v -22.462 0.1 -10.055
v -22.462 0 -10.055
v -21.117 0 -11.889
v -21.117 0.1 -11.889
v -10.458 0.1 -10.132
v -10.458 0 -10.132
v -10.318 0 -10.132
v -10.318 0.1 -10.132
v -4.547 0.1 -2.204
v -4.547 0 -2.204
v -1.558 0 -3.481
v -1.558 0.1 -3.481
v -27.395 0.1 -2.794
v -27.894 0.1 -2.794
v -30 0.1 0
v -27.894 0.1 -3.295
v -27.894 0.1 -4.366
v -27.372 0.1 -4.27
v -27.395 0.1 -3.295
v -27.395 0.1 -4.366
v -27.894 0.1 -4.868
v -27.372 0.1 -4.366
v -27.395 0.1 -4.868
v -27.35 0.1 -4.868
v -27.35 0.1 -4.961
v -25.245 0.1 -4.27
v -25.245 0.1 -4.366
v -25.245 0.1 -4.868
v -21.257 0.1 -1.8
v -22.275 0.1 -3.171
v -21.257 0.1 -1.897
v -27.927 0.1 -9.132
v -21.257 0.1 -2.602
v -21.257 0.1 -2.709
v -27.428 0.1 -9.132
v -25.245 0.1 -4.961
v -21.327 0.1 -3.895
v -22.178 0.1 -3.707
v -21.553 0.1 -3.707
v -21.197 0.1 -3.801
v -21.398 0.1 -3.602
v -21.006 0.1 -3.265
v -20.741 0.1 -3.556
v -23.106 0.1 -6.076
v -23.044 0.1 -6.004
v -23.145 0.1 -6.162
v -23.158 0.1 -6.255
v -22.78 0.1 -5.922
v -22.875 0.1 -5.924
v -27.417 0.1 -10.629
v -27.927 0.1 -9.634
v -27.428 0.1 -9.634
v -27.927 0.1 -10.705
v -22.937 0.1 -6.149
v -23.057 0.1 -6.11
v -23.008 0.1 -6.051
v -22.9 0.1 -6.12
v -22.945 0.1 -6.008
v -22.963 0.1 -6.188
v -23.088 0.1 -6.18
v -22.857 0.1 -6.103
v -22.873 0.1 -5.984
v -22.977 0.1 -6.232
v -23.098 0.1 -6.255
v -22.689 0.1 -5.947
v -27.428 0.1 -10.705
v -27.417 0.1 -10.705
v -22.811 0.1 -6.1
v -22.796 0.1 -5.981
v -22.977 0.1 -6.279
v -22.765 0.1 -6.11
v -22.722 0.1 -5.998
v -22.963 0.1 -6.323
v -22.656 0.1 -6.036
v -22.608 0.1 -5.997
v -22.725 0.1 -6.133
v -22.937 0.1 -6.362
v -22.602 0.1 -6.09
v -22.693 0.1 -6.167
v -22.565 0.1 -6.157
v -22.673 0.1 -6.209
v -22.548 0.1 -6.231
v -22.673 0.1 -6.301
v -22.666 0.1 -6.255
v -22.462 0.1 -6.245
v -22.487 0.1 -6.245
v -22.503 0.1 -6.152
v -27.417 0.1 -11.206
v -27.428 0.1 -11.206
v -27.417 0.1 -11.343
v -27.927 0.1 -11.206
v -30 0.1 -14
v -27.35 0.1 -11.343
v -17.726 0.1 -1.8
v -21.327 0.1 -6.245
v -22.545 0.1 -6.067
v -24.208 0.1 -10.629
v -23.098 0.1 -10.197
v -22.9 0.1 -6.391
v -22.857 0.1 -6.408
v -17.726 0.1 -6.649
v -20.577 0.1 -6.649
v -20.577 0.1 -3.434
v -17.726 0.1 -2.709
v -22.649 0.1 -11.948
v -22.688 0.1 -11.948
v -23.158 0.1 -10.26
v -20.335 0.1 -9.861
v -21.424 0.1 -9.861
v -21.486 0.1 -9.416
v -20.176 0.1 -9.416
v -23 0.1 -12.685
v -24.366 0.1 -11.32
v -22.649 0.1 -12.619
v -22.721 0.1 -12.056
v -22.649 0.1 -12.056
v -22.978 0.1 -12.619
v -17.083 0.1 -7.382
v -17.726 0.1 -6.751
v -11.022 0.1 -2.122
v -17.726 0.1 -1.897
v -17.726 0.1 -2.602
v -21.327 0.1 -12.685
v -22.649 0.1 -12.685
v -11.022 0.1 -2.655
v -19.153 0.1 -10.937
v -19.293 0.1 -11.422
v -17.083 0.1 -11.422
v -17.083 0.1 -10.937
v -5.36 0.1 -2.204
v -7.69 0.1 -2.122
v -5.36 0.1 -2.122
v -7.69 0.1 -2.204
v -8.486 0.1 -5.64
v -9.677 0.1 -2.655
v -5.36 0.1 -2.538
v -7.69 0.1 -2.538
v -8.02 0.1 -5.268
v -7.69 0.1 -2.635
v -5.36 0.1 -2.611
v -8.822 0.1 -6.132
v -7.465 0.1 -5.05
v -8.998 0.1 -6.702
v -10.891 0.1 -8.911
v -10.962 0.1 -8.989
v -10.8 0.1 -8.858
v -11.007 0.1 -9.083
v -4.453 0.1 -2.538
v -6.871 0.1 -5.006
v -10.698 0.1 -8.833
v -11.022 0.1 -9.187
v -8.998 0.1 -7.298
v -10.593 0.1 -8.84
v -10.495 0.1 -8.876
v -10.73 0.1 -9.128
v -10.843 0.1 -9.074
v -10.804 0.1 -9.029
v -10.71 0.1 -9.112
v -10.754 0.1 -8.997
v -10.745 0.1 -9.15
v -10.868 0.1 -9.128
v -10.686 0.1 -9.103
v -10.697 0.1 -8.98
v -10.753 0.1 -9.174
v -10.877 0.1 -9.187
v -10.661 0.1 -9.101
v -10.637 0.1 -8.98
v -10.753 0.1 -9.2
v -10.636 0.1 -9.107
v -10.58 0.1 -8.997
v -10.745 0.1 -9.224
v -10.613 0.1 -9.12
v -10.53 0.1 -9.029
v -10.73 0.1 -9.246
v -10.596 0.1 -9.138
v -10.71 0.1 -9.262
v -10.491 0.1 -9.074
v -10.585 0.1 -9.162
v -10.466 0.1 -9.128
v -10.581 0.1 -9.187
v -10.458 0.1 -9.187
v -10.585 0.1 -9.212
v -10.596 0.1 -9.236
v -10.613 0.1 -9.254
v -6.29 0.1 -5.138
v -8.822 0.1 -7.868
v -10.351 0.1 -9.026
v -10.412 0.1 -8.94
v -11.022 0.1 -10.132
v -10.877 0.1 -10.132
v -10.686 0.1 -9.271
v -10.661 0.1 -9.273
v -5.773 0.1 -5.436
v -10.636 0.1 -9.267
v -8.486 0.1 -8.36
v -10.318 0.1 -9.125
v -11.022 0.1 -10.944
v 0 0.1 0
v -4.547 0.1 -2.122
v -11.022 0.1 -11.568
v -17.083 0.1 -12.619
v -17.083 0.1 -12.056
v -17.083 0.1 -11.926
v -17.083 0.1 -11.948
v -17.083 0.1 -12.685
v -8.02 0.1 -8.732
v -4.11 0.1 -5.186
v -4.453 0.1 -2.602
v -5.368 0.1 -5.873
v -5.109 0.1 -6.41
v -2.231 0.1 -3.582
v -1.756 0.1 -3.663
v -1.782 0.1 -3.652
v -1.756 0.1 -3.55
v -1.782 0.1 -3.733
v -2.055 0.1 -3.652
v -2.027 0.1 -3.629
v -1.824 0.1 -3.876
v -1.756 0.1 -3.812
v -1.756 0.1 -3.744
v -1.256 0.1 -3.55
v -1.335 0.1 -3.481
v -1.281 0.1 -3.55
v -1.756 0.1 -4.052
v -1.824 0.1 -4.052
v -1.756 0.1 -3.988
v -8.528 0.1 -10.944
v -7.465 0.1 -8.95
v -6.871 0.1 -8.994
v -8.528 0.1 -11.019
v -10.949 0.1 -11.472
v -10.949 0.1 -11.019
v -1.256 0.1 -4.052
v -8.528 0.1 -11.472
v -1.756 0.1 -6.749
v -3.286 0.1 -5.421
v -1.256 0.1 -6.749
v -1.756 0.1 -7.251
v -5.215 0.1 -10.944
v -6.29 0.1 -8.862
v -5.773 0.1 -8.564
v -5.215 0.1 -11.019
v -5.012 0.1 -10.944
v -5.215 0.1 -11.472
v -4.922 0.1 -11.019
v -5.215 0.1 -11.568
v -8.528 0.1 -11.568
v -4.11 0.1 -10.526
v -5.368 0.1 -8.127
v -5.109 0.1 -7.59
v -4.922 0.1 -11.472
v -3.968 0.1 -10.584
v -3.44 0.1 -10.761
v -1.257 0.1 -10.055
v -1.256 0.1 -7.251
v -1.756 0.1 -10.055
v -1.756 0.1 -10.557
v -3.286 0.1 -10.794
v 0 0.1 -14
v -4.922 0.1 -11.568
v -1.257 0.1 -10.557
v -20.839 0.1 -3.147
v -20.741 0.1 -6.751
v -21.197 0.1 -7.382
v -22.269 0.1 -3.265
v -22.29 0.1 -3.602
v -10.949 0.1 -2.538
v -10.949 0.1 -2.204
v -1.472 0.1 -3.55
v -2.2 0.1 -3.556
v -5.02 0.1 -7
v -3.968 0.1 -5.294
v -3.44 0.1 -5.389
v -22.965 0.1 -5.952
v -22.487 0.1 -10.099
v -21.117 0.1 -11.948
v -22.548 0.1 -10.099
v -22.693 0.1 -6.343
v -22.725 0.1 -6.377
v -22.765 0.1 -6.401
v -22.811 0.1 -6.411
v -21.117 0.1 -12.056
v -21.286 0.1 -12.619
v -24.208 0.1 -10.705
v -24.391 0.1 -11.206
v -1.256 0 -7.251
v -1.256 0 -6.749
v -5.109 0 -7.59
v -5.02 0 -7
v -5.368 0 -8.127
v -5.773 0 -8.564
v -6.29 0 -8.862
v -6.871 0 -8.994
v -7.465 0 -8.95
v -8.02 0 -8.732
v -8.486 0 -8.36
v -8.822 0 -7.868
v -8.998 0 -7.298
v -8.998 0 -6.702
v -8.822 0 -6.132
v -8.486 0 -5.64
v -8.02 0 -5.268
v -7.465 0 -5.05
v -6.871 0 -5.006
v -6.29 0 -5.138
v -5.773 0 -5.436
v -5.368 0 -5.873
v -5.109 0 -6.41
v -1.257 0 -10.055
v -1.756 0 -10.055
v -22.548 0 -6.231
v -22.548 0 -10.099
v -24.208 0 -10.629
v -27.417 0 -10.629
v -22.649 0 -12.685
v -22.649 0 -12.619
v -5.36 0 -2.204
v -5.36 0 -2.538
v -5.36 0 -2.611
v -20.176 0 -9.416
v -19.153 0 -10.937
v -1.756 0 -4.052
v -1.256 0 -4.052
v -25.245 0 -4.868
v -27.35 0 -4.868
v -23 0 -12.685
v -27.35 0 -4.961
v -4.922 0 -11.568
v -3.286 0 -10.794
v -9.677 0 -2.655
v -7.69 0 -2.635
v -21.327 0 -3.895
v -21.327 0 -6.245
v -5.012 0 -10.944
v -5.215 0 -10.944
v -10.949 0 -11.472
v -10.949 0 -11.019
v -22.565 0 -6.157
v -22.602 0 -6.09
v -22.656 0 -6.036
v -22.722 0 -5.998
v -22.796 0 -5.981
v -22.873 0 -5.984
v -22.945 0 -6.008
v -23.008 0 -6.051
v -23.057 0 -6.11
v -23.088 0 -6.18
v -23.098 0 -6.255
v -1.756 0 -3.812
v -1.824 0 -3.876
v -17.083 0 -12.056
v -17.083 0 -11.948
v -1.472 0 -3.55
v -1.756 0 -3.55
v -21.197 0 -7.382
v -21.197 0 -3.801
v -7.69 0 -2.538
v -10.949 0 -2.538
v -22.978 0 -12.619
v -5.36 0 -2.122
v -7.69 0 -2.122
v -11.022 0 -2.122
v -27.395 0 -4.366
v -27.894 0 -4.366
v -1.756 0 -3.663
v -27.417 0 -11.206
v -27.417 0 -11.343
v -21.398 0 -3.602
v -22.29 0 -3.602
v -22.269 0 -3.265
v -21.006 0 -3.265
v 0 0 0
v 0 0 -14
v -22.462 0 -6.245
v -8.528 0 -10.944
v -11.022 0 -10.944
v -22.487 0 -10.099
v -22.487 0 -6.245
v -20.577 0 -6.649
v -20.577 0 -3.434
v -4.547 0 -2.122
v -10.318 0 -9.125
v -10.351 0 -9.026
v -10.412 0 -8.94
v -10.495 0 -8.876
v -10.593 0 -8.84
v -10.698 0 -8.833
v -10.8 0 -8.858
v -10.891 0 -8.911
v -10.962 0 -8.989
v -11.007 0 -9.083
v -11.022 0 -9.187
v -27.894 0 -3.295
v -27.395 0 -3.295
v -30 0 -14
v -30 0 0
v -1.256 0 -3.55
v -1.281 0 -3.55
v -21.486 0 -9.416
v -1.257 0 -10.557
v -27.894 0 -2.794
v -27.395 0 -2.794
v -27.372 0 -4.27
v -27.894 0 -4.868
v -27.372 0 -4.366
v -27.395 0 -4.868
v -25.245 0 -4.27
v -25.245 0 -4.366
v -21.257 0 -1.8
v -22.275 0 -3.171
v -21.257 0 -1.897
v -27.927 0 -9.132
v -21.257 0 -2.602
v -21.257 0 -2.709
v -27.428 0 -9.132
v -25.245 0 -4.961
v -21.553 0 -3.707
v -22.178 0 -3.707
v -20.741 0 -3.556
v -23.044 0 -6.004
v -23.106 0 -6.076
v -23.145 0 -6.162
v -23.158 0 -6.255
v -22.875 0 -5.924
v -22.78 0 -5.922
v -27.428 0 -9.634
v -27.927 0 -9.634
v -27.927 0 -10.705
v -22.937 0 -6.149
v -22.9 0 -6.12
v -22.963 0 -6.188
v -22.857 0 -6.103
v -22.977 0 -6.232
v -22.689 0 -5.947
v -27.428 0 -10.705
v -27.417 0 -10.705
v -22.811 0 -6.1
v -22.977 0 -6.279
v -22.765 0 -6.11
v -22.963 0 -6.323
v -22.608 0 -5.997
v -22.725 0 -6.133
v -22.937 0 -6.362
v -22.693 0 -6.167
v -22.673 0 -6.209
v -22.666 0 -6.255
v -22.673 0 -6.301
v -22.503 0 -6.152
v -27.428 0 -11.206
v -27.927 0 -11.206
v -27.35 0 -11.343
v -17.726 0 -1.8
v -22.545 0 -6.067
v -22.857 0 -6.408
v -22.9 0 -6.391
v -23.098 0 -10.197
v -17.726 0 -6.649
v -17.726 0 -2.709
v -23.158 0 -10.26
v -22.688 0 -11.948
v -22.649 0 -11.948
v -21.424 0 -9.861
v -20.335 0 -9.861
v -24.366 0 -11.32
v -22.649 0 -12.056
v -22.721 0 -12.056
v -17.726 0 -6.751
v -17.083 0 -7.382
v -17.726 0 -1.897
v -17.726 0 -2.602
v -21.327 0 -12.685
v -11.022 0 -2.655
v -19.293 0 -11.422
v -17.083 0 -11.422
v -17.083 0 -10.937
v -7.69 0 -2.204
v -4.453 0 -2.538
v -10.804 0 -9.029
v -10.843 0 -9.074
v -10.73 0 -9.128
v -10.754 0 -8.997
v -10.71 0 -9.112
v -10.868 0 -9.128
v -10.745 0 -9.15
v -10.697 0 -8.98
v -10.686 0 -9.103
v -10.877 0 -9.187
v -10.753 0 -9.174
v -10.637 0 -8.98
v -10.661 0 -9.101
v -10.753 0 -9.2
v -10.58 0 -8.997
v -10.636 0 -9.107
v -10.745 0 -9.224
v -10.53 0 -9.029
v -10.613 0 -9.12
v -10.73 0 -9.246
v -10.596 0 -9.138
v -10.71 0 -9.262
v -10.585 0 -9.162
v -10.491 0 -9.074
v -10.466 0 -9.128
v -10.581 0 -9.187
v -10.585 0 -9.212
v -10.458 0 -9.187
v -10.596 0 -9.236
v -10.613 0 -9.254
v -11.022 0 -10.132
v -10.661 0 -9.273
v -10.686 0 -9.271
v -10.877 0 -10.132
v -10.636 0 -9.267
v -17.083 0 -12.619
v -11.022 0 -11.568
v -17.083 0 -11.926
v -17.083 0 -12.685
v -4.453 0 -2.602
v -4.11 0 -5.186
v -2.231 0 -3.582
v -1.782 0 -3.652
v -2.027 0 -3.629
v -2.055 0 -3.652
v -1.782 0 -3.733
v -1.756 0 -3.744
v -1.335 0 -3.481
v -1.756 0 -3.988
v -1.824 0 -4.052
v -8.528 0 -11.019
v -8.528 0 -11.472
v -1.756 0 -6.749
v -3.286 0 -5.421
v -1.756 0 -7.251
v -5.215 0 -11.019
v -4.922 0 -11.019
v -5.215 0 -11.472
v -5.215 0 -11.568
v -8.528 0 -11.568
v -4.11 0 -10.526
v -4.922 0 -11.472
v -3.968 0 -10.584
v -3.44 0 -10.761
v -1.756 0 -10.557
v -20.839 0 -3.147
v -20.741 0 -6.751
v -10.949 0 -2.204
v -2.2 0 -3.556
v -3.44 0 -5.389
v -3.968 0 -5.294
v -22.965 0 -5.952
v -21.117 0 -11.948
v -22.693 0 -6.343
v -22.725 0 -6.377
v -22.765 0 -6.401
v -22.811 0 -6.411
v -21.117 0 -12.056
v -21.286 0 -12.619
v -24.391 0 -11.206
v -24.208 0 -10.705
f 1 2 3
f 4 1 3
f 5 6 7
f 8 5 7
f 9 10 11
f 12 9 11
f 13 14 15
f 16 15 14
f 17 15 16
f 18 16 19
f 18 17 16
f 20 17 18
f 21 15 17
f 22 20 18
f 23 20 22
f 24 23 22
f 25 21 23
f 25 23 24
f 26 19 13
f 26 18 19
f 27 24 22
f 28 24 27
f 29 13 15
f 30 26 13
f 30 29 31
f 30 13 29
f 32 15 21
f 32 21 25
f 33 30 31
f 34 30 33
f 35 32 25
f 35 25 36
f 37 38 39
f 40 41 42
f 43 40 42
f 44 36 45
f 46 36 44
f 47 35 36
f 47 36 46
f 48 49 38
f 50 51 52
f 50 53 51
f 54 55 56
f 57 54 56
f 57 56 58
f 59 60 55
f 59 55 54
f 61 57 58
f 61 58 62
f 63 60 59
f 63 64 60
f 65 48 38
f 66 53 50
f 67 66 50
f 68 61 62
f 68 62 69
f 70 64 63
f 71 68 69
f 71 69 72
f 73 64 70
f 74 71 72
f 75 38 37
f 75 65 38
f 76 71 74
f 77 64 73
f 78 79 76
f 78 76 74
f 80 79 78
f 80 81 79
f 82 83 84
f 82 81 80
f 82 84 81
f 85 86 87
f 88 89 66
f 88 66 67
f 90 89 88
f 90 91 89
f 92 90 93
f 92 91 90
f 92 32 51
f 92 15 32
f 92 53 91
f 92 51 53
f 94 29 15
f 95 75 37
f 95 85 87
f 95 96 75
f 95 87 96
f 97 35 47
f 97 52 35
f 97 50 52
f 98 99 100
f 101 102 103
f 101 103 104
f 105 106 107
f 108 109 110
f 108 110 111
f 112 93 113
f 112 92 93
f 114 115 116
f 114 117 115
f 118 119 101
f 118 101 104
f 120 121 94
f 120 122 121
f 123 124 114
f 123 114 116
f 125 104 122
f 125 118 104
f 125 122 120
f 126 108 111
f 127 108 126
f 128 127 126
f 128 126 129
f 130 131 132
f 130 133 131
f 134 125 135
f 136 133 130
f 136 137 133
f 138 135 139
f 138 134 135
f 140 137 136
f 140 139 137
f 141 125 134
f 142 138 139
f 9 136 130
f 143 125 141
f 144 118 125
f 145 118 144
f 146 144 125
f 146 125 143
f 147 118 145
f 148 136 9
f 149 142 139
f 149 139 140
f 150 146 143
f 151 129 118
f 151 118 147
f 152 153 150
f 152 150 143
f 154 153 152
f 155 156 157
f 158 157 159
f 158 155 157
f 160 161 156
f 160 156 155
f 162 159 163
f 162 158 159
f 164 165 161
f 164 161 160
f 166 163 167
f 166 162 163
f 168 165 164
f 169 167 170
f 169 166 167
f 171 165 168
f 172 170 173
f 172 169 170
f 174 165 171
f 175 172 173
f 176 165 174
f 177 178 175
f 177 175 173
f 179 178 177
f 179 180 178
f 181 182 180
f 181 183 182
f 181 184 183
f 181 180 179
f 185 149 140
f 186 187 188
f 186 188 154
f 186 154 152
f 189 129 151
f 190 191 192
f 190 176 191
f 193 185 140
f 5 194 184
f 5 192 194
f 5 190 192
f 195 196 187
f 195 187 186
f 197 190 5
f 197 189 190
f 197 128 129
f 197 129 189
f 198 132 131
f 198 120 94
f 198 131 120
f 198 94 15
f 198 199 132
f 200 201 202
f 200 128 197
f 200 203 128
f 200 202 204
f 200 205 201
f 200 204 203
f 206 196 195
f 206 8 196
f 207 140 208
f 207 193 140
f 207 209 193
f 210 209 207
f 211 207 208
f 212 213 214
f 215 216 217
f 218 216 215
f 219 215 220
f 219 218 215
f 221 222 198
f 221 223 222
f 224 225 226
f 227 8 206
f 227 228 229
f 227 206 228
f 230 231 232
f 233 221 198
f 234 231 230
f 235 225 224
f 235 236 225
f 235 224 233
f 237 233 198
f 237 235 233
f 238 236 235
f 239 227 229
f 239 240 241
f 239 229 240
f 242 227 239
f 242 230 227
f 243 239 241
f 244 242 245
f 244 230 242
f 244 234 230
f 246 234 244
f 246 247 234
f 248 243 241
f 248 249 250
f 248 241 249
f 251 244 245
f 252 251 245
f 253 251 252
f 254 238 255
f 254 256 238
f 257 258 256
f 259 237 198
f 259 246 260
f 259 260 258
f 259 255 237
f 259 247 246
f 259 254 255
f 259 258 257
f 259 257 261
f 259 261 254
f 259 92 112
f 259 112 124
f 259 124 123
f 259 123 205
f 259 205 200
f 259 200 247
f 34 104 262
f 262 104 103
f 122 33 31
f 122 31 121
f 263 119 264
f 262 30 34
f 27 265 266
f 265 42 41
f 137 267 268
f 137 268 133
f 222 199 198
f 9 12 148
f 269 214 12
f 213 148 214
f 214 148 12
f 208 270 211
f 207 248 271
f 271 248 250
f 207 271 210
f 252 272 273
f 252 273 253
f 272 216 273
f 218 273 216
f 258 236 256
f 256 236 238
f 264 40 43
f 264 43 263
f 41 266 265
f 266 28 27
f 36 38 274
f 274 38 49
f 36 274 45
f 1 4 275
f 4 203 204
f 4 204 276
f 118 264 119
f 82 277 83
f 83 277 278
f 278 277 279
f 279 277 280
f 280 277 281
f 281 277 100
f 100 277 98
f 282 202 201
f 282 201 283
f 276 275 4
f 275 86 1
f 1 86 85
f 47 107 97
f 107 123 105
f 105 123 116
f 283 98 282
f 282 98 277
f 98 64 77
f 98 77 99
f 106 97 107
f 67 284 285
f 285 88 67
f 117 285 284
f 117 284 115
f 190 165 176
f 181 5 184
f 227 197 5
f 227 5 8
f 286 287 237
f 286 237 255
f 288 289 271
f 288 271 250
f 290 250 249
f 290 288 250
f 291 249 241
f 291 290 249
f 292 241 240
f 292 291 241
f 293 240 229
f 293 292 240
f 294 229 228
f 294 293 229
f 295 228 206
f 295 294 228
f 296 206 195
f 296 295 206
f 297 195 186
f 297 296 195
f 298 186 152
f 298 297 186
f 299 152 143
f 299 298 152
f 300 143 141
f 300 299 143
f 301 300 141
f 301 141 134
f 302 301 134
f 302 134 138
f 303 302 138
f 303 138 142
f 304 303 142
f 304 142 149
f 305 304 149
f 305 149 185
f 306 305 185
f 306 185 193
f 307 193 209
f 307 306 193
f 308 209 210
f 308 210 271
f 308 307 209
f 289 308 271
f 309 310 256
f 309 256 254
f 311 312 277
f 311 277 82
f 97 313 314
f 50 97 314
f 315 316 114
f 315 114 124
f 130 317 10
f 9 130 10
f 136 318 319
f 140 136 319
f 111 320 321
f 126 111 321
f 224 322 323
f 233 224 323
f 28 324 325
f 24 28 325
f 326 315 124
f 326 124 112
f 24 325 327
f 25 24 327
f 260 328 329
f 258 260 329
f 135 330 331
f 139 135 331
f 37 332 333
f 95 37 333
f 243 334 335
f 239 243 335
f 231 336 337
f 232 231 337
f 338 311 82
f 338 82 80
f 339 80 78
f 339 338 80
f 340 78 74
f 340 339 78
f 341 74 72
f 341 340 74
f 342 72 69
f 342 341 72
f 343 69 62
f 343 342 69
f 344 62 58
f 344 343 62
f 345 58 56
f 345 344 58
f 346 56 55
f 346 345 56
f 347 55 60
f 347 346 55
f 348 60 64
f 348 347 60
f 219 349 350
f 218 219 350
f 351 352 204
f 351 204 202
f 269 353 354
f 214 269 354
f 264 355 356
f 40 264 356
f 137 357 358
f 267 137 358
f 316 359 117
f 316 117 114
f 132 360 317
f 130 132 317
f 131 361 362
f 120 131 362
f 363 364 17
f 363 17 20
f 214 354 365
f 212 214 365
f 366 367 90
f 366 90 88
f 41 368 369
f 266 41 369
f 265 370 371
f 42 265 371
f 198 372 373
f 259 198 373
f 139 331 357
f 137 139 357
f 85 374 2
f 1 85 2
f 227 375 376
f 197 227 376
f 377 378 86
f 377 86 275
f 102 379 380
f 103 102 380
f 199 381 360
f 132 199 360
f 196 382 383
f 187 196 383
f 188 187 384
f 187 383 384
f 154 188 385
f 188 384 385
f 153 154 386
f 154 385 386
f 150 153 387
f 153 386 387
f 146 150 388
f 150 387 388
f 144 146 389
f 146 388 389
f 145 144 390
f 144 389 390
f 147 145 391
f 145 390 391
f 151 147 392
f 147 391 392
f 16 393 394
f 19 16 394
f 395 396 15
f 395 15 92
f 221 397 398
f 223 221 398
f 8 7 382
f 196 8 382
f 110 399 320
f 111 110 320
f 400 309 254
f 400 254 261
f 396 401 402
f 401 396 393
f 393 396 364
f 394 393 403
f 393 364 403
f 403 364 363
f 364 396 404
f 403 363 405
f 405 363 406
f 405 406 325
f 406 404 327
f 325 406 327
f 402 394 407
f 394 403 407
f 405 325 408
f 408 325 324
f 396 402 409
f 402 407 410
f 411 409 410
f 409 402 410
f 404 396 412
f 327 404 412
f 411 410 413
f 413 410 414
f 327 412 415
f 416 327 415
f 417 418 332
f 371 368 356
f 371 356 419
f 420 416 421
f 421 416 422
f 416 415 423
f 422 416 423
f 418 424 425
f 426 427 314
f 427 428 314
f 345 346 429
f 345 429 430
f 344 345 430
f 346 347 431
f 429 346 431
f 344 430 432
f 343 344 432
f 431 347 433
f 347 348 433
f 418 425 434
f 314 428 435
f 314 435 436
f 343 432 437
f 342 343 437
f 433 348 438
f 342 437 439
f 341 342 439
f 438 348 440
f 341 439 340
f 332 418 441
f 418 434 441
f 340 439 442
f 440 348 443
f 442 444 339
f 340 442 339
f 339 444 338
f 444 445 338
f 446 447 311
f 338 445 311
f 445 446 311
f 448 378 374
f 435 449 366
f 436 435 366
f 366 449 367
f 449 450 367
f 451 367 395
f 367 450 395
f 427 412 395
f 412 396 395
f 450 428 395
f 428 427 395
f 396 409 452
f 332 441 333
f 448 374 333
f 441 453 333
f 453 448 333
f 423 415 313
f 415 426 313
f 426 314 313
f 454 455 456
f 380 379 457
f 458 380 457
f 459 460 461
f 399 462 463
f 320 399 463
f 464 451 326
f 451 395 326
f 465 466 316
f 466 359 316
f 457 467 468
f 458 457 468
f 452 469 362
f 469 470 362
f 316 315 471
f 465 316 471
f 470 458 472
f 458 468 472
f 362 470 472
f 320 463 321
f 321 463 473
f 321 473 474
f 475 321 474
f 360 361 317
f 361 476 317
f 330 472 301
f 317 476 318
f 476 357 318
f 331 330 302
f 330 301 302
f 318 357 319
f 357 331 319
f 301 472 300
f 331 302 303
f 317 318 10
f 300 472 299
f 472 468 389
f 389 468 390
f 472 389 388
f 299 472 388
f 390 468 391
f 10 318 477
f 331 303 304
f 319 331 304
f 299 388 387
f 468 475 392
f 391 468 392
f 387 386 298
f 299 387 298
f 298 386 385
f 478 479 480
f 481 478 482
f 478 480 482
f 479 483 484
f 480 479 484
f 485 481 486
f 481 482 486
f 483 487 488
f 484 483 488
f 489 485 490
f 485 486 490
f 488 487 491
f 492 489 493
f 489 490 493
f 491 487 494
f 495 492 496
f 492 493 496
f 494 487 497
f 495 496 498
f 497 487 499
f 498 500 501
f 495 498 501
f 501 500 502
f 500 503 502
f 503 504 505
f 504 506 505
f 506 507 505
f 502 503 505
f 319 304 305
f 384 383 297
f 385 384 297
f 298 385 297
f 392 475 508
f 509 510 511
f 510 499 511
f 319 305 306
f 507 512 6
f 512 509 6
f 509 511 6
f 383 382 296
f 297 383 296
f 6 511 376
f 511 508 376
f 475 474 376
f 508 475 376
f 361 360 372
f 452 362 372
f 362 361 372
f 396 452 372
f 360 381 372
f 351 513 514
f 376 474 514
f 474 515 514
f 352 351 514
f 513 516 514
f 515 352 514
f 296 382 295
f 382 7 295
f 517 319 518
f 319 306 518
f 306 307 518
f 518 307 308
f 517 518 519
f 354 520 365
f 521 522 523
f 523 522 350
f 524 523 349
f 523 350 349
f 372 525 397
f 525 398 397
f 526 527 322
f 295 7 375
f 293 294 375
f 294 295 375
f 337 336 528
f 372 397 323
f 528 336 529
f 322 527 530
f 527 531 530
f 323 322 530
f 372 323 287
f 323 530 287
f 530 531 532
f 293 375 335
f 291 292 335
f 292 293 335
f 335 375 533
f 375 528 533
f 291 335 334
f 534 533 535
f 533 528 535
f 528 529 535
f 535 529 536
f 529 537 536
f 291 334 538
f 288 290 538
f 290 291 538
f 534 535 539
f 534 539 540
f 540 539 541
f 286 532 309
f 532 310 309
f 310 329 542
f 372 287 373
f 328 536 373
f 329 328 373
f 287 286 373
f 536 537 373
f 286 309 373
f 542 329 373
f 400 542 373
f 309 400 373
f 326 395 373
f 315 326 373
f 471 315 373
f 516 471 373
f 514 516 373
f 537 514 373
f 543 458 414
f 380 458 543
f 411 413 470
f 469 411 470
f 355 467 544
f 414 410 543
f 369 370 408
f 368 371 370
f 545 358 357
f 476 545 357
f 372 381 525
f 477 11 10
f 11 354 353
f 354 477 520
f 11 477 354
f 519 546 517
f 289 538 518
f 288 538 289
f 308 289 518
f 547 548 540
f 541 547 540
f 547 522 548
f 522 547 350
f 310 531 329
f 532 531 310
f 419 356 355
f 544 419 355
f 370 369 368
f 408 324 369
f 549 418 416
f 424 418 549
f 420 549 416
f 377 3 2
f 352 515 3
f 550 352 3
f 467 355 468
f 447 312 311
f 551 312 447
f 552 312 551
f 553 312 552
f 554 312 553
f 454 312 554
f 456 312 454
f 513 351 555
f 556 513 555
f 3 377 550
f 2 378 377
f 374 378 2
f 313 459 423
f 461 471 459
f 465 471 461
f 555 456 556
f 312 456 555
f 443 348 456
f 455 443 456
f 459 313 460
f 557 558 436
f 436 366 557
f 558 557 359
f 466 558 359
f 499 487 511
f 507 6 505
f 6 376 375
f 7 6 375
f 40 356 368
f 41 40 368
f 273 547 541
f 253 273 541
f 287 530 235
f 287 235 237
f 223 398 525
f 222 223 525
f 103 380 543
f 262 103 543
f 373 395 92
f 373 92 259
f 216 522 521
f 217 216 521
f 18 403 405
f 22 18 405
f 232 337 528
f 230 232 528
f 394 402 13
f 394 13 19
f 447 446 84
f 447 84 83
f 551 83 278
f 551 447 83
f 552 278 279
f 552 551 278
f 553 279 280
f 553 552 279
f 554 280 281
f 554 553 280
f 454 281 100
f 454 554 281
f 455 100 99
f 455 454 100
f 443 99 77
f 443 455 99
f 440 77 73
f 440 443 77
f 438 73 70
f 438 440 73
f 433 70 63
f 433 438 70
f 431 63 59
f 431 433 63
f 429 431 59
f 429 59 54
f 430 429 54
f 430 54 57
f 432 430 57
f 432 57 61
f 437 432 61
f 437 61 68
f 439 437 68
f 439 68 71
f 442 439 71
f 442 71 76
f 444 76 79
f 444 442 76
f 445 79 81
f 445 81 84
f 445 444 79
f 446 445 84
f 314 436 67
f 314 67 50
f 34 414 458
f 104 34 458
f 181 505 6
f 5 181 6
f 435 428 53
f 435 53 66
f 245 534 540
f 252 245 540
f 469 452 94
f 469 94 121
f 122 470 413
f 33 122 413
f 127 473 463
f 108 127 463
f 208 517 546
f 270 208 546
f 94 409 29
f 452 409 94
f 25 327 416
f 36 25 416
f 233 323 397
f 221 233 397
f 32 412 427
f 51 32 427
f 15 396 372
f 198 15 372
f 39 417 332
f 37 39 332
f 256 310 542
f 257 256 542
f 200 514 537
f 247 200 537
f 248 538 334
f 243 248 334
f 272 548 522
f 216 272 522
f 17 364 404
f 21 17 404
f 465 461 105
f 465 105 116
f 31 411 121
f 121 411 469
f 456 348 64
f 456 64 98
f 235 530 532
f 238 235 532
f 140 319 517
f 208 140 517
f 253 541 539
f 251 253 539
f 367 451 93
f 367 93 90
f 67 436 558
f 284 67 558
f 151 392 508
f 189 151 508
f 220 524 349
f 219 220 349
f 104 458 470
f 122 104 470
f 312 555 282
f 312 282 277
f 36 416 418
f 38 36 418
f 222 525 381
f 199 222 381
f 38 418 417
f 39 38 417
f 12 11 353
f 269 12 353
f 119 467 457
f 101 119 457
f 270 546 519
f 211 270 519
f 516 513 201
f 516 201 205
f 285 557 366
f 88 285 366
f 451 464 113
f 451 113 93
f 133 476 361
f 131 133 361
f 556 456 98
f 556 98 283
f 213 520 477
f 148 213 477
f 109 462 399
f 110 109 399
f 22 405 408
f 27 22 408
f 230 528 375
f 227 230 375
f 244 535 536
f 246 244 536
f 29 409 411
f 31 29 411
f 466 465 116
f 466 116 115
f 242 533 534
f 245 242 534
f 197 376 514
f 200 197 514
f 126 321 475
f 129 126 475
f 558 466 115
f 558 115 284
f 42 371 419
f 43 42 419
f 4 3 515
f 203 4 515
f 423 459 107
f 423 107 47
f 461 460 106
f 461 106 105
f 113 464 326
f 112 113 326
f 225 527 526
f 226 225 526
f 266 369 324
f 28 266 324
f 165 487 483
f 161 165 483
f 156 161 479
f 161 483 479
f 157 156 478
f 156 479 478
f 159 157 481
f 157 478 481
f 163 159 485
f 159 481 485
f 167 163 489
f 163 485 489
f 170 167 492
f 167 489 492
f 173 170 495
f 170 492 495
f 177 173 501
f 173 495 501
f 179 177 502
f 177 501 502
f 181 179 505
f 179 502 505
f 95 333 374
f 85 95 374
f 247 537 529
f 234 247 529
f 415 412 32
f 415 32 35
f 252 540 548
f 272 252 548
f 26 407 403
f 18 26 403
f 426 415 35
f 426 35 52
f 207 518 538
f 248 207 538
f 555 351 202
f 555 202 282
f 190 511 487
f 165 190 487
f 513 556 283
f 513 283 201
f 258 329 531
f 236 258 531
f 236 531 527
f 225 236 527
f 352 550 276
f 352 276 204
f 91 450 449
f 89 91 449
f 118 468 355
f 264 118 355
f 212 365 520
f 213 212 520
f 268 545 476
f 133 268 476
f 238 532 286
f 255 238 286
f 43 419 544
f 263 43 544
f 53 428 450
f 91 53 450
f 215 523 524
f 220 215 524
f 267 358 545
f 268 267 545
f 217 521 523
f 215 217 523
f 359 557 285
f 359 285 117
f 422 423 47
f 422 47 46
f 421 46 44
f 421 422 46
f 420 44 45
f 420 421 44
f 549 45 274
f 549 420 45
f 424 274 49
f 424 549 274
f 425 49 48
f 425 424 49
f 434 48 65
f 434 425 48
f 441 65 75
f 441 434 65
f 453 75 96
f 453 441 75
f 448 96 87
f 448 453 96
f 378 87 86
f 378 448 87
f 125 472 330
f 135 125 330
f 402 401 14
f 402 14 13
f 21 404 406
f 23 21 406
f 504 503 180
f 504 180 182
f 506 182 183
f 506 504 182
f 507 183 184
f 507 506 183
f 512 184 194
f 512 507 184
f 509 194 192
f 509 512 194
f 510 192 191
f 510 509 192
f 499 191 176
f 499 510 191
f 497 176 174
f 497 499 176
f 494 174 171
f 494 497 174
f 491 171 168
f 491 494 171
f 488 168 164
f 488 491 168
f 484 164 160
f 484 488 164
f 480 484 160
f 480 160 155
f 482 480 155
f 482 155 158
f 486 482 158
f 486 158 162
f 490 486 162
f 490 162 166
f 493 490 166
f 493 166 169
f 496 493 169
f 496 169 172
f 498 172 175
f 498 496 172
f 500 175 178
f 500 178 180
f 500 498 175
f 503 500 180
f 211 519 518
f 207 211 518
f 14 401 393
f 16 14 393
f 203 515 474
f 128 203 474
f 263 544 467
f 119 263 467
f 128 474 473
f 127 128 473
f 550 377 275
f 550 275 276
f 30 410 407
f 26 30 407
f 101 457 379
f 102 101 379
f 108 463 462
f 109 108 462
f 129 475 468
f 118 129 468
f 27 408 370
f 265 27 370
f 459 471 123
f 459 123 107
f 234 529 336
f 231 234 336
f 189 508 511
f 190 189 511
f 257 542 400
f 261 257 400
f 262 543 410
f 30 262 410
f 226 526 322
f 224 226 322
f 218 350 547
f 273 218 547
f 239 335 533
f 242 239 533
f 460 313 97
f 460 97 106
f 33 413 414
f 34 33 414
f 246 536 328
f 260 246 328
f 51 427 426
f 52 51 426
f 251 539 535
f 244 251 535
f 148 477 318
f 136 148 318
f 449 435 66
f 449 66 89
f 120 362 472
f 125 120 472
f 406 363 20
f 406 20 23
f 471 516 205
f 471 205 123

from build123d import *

# Parameters (mm, degrees)
SKETCH1_W           = 30
SKETCH1_H           = 14
SKETCH1_R           = 2
SKETCH1_R_2         = 0.156028334
SKETCH1_R_3         = 0.086225259
SKETCH1_W_2         = 0.499197809
SKETCH1_H_2         = 0.501456342
SKETCH1_H_3         = 0.501456343
SKETCH1_W_3         = 3.5304532
SKETCH1_H_4         = 0.096477131
BOSS_EXTRUDE2_DEPTH = 0.1


with BuildPart() as part:
    # Sketch1 → Boss-Extrude2 (new body)
    with BuildSketch(Plane(origin=(0, 0, 0), x_dir=(1, 0, 0), z_dir=(0, 1, 0))):
        with Locations((-15, 7)):
            Rectangle(SKETCH1_W, SKETCH1_H)
        with Locations((-7.020370045, 7)):
            Circle(SKETCH1_R, mode=Mode.SUBTRACT)
        with Locations((-22.822406344, 6.255391347)):
            Circle(SKETCH1_R_2, mode=Mode.SUBTRACT)
        with Locations((-10.66724947, 9.187062819)):
            Circle(SKETCH1_R_3, mode=Mode.SUBTRACT)
        with Locations((-1.506295526, 10.305773891)):
            Rectangle(SKETCH1_W_2, SKETCH1_H_2, mode=Mode.SUBTRACT)
        with Locations((-1.506058557, 7)):
            Rectangle(SKETCH1_W_2, SKETCH1_H_2, mode=Mode.SUBTRACT)
        Polygon((-1.256485692, 3.550454026), (-1.28140444, 3.550454026), (-1.335016171, 3.481213999), (-4.54690164, 2.121887432), (-5.360261371, 2.121887432), (-5.360261371, 2.203832458), (-4.54690164, 2.203832458), (-1.558352374, 3.481213999), (-1.472133003, 3.550454026), (-1.755683501, 3.550454026), (-1.755683501, 3.663429203), (-1.781688576, 3.652423397), (-4.453252976, 2.537894228), (-5.360261371, 2.537894228), (-5.360261371, 2.611390791), (-4.453252976, 2.602147786), (-2.199910697, 3.555801973), (-2.230986224, 3.58233105), (-4.109880419, 5.186336967), (-4.109880419, 10.52625285), (-5.01178132, 10.9436629), (-5.2151716, 10.9436629), (-5.2151716, 11.019115731), (-4.92219693, 11.019115731), (-3.967960979, 10.583630365), (-3.967960979, 5.294234739), (-2.054874003, 3.652423397), (-2.027101226, 3.628937988), (-1.781688576, 3.732800949), (-1.755683501, 3.743806755), (-1.755683501, 3.811781185), (-1.824138086, 3.875872934), (-3.440230513, 5.388966468), (-3.440230513, 10.76142511), (-4.92219693, 11.471832711), (-5.2151716, 11.471832711), (-5.2151716, 11.567863586), (-4.92219693, 11.567863586), (-3.286271687, 10.793793894), (-3.286271687, 5.420857378), (-1.824138086, 4.051910368), (-1.755683501, 3.987818619), (-1.755683501, 4.051910368), (-1.256485692, 4.051910368), align=None, mode=Mode.SUBTRACT)
        Polygon((-20.740691313, 3.555801973), (-20.740691313, 6.751171354), (-17.726140192, 6.751171354), (-17.726140192, 6.648804669), (-20.577135817, 6.648804669), (-20.577135817, 6.588691856), (-20.577135817, 3.434422851), (-20.839350262, 3.147232695), (-22.275377127, 3.170945708), (-25.245108692, 4.270018773), (-27.280489968, 4.270018773), (-27.371609442, 4.270018773), (-27.371609442, 4.36632395), (-27.280489968, 4.36632395), (-25.245108692, 4.36632395), (-22.268787234, 3.26481202), (-21.006375102, 3.26481202), align=None, mode=Mode.SUBTRACT)
        Polygon((-21.196743275, 7.250728171), (-21.196743275, 4.159991696), (-21.196743275, 3.801090583), (-21.398034662, 3.601705999), (-22.289698939, 3.601705999), (-25.245108692, 4.867780292), (-27.280489968, 4.867780292), (-27.350305288, 4.867780292), (-27.350305288, 4.960770533), (-27.280489968, 4.960770533), (-25.245108692, 4.960770533), (-22.177931991, 3.706985367), (-21.552803523, 3.706985367), (-21.32716444, 3.895195799), (-21.32716444, 6.24470924), (-22.461941115, 6.24470924), (-22.461941115, 10.05504572), (-21.11708673, 11.889354862), (-17.082611668, 11.926021935), (-17.082611668, 11.511053117), (-17.082611668, 11.422021861), (-17.122361985, 11.422021861), (-19.29309074, 11.422021861), (-20.335207519, 9.860770298), (-21.423827816, 9.860770298), (-21.486437697, 9.415587946), (-20.176259884, 9.415587946), (-19.152866511, 10.937472578), (-17.122361985, 10.937472578), (-17.082611668, 10.937472578), (-17.082611668, 10.879889975), (-17.082611668, 7.382432578), (-17.726140192, 7.382432578), (-20.577135817, 7.382432578), (-21.196743275, 7.382432578), align=None, mode=Mode.SUBTRACT)
        with Locations((-27.644321584, 3.044426332)):
            Rectangle(SKETCH1_W_2, SKETCH1_H_3, mode=Mode.SUBTRACT)
        with Locations((-27.644321584, 4.617052121)):
            Rectangle(SKETCH1_W_2, SKETCH1_H_2, mode=Mode.SUBTRACT)
        with Locations((-27.677861275, 9.382947879)):
            Rectangle(SKETCH1_W_2, SKETCH1_H_2, mode=Mode.SUBTRACT)
        with Locations((-27.677861275, 10.955573669)):
            Rectangle(SKETCH1_W_2, SKETCH1_H_3, mode=Mode.SUBTRACT)
        Polygon((-27.350305288, 11.20630184), (-24.391373084, 11.20630184), (-22.978434678, 12.619240246), (-22.649427056, 12.619240246), (-22.649427056, 12.684571648), (-23.000461853, 12.684571648), (-24.206065105, 11.478968396), (-24.365525074, 11.319508427), (-27.350305288, 11.342635118), (-27.41709617, 11.342635118), (-27.41709617, 11.20630184), align=None, mode=Mode.SUBTRACT)
        Polygon((-22.649427056, 12.055976166), (-22.721193305, 12.055976166), (-24.207502155, 10.704845497), (-27.350305288, 10.704845497), (-27.41709617, 10.704845497), (-27.41709617, 10.628998487), (-27.350305288, 10.628998487), (-24.207502155, 10.628998487), (-22.687589847, 11.947769263), (-22.649427056, 11.947769263), align=None, mode=Mode.SUBTRACT)
        Polygon((-21.256593392, 2.708605309), (-20.577135817, 2.708605309), (-17.726140192, 2.708605309), (-17.726140192, 2.602147786), (-20.577135817, 2.602147786), (-21.256593392, 2.602147786), align=None, mode=Mode.SUBTRACT)
        with Locations((-19.491366792, 1.848628129)):
            Rectangle(SKETCH1_W_3, SKETCH1_H_4, mode=Mode.SUBTRACT)
        with BuildLine():
            Line((-22.547722421, 9.635418098), (-22.547722421, 6.231004531))
            ThreePointArc((-22.547722421, 6.231004531), (-22.834611713, 5.979897239), (-23.09817069, 6.255391347))
            Line((-23.09817069, 6.255391347), (-23.09817069, 9.635418098))
            Line((-23.09817069, 9.635418098), (-23.09817069, 10.19716986))
            Line((-23.09817069, 10.19716986), (-21.285526409, 12.619240246))
            Line((-21.285526409, 12.619240246), (-17.082611668, 12.619240246))
            Line((-17.082611668, 12.619240246), (-17.082611668, 12.684571648))
            Line((-17.082611668, 12.684571648), (-21.32716444, 12.684571648))
            Line((-21.32716444, 12.684571648), (-23.158169226, 10.26019319))
            Line((-23.158169226, 10.26019319), (-23.158169226, 9.635418098))
            Line((-23.158169226, 9.635418098), (-23.158169226, 6.255391347))
            ThreePointArc((-23.158169226, 6.255391347), (-22.827748074, 5.91967096), (-22.486813428, 6.24470924))
            Line((-22.486813428, 6.24470924), (-22.486813428, 10.099242499))
            Line((-22.486813428, 10.099242499), (-21.11708673, 11.947769263))
            Line((-21.11708673, 11.947769263), (-17.082611668, 11.947769263))
            Line((-17.082611668, 11.947769263), (-17.082611668, 12.055976166))
            Line((-17.082611668, 12.055976166), (-21.11708673, 12.055976166))
            Line((-21.11708673, 12.055976166), (-22.547722421, 10.099242499))
            Line((-22.547722421, 10.099242499), (-22.547722421, 9.635418098))
        make_face(mode=Mode.SUBTRACT)
        Polygon((-9.676546893, 2.655376547), (-7.690286822, 2.635135266), (-7.690286822, 2.537894228), (-10.948813257, 2.537894228), (-10.948813257, 2.203832458), (-7.690286822, 2.203832458), (-7.690286822, 2.121887432), (-9.723371226, 2.121887432), (-11.022343809, 2.121887432), (-11.022343809, 2.655376547), align=None, mode=Mode.SUBTRACT)
        with BuildLine():
            Line((-11.022343809, 9.187062819), (-11.022343809, 10.13231451))
            Line((-11.022343809, 10.13231451), (-10.876593598, 10.13231451))
            Line((-10.876593598, 10.13231451), (-10.876593598, 9.187062819))
            ThreePointArc((-10.876593598, 9.187062819), (-10.66724947, 8.97771869), (-10.457905342, 9.187062819))
            Line((-10.457905342, 9.187062819), (-10.457905342, 10.13231451))
            Line((-10.457905342, 10.13231451), (-10.317570093, 10.13231451))
            Line((-10.317570093, 10.13231451), (-10.317570093, 9.125286422))
            ThreePointArc((-10.317570093, 9.125286422), (-10.698256102, 8.83332481), (-11.022343809, 9.187062819))
        make_face(mode=Mode.SUBTRACT)
        Polygon((-11.022343809, 11.567863586), (-8.527519195, 11.567863586), (-8.527519195, 11.471832711), (-8.617764349, 11.471832711), (-10.948813257, 11.471832711), (-10.948813257, 11.019115731), (-8.617764349, 11.019115731), (-8.527519195, 11.019115731), (-8.527519195, 10.9436629), (-11.022343809, 10.9436629), (-11.022343809, 11.266245402), align=None, mode=Mode.SUBTRACT)
    extrude(amount=BOSS_EXTRUDE2_DEPTH)


solid = part.part
